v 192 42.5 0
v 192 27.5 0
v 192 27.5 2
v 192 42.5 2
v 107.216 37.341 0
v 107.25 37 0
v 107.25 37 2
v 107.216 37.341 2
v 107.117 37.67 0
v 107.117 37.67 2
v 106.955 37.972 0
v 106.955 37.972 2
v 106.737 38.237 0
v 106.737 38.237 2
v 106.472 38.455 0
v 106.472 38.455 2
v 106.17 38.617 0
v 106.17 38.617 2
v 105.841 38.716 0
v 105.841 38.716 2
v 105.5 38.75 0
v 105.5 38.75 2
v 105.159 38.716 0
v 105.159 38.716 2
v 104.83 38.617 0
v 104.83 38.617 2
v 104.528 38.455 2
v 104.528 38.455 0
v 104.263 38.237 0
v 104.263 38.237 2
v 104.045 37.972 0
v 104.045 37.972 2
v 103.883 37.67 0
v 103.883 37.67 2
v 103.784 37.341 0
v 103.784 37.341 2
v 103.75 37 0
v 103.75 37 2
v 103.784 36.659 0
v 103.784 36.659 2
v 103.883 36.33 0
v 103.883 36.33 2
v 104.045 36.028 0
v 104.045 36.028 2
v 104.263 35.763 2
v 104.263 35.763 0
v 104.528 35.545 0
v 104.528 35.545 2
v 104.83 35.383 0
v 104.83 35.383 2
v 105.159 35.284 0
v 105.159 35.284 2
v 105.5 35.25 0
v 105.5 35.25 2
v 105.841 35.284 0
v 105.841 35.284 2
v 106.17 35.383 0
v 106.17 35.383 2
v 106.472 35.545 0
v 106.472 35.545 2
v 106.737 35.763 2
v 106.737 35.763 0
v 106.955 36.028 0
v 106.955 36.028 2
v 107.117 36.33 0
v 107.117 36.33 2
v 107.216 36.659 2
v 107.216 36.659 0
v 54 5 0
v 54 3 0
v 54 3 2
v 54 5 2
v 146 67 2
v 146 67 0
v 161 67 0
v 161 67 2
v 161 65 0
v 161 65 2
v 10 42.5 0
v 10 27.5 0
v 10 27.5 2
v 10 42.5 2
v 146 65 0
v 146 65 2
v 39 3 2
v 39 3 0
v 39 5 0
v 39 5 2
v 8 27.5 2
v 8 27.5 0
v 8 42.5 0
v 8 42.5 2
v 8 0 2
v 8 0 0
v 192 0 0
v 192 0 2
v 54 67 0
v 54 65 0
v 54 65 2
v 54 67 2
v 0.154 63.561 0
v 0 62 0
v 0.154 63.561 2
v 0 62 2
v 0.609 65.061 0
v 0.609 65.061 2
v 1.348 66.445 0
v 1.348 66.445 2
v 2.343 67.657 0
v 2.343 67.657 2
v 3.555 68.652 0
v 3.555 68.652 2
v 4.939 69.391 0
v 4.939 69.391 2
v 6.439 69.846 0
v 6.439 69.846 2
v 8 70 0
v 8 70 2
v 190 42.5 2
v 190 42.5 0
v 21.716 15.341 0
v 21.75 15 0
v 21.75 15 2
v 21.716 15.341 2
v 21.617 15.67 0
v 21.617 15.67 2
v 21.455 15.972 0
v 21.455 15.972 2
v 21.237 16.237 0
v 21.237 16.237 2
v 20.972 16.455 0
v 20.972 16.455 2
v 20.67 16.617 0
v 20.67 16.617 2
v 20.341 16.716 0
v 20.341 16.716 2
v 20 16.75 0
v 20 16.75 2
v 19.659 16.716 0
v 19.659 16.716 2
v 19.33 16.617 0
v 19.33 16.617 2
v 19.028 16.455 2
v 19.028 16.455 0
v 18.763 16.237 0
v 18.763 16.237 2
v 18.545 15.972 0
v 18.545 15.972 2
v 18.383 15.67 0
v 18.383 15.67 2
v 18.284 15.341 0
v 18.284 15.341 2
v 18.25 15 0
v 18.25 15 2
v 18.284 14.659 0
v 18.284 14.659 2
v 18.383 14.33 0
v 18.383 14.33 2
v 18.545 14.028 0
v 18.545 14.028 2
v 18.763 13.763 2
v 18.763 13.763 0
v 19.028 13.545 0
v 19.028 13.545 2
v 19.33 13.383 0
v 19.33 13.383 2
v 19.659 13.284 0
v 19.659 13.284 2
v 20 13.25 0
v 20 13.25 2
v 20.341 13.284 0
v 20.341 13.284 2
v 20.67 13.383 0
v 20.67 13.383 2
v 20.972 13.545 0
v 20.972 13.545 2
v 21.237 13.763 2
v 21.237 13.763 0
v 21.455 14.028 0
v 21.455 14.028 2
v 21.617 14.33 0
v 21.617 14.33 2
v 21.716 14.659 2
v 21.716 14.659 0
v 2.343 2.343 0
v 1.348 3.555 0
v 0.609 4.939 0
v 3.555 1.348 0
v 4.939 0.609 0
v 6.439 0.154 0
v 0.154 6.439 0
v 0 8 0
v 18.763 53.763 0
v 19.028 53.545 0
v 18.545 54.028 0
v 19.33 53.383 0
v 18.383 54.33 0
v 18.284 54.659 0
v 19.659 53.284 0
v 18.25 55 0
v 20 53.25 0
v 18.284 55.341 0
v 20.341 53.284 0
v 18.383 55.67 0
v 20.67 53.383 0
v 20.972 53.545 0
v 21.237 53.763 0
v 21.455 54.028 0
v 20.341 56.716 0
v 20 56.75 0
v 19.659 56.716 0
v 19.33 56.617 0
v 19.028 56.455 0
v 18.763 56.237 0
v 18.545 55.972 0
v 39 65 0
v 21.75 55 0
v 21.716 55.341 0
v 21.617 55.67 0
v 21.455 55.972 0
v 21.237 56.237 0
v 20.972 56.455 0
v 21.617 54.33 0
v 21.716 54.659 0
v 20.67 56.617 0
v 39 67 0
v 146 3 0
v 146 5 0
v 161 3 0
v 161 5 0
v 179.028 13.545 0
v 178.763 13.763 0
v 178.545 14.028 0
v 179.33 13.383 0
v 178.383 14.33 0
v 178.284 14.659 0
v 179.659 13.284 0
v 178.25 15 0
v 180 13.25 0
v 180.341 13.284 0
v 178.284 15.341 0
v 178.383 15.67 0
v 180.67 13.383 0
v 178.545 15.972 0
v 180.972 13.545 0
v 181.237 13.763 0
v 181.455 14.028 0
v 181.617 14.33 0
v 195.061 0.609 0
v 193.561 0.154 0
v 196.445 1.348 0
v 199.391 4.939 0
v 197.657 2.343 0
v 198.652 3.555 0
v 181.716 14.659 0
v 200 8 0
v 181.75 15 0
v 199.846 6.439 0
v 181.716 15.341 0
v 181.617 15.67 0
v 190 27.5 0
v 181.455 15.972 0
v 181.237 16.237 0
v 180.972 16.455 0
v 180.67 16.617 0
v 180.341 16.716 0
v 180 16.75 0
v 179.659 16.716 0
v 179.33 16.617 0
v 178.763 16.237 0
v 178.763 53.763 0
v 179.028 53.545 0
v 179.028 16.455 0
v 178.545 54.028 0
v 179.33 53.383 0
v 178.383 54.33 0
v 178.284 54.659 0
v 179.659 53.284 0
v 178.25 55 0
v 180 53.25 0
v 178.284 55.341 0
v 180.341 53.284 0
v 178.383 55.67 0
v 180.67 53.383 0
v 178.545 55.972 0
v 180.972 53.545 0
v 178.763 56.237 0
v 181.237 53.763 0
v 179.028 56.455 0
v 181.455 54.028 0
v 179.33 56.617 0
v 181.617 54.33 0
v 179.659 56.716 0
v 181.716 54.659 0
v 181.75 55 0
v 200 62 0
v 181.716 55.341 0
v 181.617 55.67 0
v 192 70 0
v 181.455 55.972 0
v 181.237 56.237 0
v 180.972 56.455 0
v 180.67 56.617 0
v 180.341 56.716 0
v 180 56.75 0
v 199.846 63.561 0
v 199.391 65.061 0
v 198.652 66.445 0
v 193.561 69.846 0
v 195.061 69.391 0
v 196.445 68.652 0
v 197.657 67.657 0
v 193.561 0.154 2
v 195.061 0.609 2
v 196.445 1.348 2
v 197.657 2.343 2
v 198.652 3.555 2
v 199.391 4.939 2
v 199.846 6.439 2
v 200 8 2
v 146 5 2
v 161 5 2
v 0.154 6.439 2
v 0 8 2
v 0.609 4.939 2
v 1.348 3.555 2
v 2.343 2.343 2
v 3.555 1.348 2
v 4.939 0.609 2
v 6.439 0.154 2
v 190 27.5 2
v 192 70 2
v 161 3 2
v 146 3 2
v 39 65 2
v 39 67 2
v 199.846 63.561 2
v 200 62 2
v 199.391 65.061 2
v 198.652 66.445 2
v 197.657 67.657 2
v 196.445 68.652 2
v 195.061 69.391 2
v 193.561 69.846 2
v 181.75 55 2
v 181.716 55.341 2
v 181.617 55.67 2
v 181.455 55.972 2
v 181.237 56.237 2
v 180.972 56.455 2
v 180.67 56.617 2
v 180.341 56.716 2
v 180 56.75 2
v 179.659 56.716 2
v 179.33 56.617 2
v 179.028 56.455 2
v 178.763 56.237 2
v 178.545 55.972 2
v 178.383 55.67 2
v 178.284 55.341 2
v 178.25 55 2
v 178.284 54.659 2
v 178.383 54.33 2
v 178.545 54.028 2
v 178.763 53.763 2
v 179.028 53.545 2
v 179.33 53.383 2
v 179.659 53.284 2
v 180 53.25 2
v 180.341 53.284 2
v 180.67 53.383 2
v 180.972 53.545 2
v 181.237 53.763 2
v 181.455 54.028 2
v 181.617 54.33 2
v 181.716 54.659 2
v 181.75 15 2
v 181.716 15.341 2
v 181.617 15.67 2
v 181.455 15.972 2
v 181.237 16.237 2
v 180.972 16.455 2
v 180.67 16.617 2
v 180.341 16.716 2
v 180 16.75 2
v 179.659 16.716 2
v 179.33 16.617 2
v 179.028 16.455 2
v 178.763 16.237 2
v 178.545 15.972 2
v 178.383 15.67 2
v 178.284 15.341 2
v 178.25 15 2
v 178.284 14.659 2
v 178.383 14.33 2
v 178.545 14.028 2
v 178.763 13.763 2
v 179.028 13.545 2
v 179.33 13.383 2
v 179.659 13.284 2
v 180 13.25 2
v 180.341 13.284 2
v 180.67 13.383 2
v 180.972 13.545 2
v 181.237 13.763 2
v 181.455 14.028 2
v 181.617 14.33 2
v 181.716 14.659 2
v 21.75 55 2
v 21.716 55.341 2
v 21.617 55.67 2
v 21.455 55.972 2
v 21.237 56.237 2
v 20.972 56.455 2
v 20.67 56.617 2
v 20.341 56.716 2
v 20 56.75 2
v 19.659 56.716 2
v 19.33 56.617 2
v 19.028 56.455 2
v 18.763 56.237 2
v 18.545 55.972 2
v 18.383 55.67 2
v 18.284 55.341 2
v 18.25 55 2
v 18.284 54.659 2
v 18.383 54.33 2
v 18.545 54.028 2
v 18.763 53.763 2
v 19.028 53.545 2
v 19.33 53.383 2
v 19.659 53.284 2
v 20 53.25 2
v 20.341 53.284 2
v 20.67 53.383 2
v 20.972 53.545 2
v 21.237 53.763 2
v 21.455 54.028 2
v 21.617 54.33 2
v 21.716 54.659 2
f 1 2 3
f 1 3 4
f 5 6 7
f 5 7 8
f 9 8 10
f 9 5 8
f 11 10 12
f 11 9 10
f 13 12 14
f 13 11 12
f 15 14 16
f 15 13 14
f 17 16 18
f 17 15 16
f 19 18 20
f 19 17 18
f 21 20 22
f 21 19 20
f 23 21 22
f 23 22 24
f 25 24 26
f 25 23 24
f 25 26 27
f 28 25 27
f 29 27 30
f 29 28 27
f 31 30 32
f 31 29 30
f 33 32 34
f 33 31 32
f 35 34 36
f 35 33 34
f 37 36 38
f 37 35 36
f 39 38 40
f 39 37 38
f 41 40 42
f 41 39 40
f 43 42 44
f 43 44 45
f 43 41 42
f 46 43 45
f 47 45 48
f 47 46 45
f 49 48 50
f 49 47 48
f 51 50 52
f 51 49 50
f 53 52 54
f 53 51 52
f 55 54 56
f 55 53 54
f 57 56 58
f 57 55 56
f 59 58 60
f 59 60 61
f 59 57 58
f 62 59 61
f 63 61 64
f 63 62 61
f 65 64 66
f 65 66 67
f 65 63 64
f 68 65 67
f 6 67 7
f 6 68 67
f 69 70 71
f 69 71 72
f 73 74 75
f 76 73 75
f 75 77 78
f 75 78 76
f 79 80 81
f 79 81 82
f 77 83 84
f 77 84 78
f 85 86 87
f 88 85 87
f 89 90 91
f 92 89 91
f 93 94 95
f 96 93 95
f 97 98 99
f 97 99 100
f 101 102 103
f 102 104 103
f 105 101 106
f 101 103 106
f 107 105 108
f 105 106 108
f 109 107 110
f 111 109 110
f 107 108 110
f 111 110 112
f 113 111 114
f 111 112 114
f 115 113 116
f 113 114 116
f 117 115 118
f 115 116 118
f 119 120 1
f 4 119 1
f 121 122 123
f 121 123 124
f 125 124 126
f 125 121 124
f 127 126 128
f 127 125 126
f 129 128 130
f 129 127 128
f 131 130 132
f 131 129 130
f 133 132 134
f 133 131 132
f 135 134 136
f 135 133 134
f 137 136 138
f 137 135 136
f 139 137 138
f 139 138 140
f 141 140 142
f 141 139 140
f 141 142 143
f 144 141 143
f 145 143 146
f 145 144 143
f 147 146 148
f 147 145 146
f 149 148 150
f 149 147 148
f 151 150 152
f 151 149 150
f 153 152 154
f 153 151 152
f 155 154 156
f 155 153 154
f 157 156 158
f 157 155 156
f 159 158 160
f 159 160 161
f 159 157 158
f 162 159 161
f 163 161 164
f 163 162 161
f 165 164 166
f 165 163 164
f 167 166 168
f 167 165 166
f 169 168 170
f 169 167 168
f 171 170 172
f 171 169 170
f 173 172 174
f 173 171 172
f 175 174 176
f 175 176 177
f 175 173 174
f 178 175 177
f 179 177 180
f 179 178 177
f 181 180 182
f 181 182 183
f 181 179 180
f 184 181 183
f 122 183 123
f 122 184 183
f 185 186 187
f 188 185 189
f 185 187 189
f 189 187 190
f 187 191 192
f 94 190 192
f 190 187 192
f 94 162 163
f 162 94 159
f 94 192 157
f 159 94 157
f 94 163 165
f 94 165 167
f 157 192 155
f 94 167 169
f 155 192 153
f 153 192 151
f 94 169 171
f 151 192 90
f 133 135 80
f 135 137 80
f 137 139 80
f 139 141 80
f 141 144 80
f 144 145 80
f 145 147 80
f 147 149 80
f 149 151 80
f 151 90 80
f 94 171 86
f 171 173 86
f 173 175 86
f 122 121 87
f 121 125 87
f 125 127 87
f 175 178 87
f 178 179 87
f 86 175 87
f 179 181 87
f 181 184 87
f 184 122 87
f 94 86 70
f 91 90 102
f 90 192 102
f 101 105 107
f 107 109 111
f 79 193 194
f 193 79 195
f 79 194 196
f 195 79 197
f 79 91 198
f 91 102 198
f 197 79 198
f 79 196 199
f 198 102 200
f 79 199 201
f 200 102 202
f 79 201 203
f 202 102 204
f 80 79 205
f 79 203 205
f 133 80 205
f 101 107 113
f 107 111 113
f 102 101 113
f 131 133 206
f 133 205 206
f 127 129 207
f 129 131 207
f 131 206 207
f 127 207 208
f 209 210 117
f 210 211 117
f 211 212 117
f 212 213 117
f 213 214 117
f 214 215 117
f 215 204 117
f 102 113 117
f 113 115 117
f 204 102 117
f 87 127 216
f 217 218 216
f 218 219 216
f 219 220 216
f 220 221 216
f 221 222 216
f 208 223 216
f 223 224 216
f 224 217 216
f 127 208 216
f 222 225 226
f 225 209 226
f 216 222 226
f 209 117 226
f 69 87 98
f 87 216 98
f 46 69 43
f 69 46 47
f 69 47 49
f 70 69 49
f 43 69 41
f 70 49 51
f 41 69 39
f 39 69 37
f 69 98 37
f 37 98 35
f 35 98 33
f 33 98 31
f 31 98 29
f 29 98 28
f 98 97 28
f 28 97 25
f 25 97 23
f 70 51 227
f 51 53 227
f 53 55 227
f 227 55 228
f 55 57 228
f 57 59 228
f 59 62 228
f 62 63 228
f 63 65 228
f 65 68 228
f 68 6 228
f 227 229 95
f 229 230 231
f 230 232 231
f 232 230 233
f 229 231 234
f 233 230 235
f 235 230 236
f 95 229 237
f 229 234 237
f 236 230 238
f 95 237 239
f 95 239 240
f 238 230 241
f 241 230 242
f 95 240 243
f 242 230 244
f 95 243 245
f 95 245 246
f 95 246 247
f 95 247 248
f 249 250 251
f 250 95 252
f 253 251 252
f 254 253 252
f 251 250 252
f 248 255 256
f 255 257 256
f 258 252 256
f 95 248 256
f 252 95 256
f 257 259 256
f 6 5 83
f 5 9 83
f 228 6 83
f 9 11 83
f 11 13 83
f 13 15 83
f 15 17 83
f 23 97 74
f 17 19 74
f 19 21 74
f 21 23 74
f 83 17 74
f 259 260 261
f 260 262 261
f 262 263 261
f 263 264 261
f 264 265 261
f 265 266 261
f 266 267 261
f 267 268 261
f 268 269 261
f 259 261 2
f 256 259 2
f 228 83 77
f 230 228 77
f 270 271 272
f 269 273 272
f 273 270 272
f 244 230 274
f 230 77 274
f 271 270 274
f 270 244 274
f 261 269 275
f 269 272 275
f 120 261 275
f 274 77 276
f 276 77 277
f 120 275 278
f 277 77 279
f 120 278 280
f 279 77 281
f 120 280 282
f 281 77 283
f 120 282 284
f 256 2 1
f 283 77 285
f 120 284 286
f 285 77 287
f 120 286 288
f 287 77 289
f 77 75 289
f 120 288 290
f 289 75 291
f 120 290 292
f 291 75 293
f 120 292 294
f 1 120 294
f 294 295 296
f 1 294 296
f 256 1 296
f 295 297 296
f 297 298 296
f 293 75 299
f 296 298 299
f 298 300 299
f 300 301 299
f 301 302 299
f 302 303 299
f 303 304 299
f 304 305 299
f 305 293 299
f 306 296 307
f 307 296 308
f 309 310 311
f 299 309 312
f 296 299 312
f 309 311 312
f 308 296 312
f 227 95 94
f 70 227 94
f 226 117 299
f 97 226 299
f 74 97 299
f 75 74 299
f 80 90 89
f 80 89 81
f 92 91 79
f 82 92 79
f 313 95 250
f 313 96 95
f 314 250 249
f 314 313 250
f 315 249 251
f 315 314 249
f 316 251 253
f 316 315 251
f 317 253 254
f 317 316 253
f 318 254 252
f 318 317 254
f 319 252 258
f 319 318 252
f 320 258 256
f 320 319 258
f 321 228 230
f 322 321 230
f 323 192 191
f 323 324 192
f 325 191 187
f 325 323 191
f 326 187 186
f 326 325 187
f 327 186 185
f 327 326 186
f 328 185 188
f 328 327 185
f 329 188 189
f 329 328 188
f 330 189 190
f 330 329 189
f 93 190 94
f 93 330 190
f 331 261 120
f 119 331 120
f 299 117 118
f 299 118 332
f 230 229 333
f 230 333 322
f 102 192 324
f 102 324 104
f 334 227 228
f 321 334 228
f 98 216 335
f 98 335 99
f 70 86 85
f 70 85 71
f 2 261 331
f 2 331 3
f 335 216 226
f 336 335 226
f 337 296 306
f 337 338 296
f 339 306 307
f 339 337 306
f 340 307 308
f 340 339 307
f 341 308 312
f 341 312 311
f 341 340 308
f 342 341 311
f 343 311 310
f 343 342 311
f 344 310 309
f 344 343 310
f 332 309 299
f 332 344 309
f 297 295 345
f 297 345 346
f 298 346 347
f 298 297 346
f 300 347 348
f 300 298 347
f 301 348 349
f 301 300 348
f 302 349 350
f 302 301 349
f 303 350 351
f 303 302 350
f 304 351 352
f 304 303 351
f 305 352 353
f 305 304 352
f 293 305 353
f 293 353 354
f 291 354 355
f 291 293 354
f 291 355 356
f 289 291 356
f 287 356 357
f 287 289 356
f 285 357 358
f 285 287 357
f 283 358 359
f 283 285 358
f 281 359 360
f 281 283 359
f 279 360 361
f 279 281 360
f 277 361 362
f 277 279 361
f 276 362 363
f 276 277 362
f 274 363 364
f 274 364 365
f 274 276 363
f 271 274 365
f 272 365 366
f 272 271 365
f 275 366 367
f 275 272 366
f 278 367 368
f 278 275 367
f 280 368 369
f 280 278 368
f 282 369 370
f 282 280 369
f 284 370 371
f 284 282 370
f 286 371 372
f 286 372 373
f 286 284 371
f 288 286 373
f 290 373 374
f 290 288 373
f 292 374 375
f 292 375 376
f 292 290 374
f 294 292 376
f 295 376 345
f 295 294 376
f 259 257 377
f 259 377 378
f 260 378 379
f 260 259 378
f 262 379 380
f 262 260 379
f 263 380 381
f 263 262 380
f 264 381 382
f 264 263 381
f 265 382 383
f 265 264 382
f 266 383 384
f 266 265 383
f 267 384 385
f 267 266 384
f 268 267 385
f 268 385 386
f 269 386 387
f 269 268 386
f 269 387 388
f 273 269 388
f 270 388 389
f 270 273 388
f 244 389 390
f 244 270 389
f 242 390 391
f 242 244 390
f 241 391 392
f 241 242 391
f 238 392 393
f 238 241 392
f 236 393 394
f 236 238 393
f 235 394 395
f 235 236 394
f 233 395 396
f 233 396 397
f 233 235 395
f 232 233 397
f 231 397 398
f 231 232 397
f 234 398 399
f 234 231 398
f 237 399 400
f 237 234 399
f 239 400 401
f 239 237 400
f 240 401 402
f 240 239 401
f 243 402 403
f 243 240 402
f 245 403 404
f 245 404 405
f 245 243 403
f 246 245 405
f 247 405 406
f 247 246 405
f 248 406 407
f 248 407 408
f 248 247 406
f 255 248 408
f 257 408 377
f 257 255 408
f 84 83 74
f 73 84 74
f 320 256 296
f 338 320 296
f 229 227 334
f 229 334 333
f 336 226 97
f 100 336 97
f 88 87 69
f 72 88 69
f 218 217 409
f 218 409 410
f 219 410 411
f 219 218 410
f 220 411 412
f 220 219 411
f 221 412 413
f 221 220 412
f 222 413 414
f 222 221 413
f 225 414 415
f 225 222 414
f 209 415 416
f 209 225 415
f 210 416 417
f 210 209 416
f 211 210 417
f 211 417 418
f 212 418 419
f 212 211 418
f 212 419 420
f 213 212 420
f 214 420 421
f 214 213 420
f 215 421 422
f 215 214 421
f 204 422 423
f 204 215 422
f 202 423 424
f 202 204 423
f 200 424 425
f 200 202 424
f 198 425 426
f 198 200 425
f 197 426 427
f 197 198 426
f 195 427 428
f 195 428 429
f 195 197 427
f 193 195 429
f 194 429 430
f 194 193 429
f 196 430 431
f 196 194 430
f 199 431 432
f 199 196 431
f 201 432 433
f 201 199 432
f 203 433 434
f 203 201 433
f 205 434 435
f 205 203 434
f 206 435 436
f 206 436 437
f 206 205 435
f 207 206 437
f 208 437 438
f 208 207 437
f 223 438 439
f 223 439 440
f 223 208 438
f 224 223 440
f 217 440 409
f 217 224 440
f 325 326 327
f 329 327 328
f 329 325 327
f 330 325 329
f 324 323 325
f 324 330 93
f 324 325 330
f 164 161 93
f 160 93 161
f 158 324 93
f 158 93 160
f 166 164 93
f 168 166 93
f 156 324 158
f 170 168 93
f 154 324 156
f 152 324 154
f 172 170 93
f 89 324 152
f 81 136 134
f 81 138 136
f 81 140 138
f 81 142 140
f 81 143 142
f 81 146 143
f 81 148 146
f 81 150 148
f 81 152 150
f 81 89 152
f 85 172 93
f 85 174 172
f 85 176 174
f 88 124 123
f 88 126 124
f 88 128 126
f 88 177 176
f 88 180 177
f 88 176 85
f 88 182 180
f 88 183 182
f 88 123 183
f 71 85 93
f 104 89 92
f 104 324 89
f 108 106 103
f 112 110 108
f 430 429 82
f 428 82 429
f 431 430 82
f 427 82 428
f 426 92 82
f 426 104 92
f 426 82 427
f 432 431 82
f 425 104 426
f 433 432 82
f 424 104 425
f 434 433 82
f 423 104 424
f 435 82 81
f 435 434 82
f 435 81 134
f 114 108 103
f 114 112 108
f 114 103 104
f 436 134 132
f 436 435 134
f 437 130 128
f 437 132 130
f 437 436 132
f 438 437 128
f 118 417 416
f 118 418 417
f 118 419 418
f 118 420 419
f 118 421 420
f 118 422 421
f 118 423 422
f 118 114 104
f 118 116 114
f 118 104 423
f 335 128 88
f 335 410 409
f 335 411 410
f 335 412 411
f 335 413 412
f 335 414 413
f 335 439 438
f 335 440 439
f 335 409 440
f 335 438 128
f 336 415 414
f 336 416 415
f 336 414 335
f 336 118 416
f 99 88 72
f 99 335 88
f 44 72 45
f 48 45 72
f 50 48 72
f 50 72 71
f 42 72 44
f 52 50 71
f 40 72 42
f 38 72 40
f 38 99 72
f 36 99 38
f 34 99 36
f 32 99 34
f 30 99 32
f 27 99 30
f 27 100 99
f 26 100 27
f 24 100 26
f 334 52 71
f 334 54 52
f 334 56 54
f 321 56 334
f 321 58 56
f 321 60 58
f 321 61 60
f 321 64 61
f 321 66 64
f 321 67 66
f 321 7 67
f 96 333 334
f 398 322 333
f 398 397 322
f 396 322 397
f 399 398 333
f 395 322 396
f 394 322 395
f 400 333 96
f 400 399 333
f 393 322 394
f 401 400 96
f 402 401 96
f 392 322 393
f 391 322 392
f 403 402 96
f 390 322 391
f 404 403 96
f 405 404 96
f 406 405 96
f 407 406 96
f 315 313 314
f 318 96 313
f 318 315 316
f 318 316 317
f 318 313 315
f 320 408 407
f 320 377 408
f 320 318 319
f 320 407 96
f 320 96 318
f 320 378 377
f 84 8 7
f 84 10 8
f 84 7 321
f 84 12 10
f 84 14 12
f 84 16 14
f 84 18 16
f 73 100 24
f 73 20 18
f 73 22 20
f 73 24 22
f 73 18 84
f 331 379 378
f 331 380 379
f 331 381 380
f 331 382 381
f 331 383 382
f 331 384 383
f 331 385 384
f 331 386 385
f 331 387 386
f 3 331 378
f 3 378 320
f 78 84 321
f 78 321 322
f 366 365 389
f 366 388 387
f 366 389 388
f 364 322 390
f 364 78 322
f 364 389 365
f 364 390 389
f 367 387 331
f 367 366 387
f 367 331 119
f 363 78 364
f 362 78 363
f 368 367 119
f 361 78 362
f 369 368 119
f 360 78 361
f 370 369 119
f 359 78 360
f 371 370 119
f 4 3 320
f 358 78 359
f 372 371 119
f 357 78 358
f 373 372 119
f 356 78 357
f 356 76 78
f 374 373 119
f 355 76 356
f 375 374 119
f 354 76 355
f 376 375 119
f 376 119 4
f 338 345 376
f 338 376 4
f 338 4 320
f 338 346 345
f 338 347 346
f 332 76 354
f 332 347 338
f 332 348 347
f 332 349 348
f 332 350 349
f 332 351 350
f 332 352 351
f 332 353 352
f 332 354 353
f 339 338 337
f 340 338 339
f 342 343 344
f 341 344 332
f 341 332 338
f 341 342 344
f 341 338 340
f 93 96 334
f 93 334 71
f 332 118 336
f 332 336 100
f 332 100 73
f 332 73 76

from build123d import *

# Parameters (mm, degrees)
SKETCH001_W  = 200
SKETCH001_H  = 70
PAD_DEPTH    = 2
FILLET_R     = 8
SKETCH_R     = 1.75
SKETCH_W     = 15
SKETCH_H     = 2
SKETCH_W_2   = 2
SKETCH_H_2   = 15
POCKET_DEPTH = 2


with BuildPart() as part:
    # Sketch001 → Pad (new body)
    with BuildSketch(Plane.XY):
        with Locations((100, 35)):
            Rectangle(SKETCH001_W, SKETCH001_H)
    extrude(amount=PAD_DEPTH)

    # Fillet
    fillet_edges = [part.edges().sort_by_distance(p)[0] for p in [
        (0, 70, 1),
        (200, 70, 1),
        (0, 0, 1),
        (200, 0, 1),
    ]]
    fillet(fillet_edges, radius=FILLET_R)

    # Sketch → Pocket (cut)
    with BuildSketch(Plane.XY):
        with Locations((20, 55)):
            Circle(SKETCH_R)
        with Locations((20, 15)):
            Circle(SKETCH_R)
        with Locations((180, 55)):
            Circle(SKETCH_R)
        with Locations((180, 15)):
            Circle(SKETCH_R)
        with Locations((105.5, 37)):
            Circle(SKETCH_R)
        with Locations((46.5, 66)):
            Rectangle(SKETCH_W, SKETCH_H)
        with Locations((46.5, 4)):
            Rectangle(SKETCH_W, SKETCH_H)
        with Locations((153.5, 66)):
            Rectangle(SKETCH_W, SKETCH_H)
        with Locations((153.5, 4)):
            Rectangle(SKETCH_W, SKETCH_H)
        with Locations((9, 35)):
            Rectangle(SKETCH_W_2, SKETCH_H_2)
        with Locations((191, 35)):
            Rectangle(SKETCH_W_2, SKETCH_H_2)
    extrude(amount=POCKET_DEPTH, mode=Mode.SUBTRACT)


solid = part.part
